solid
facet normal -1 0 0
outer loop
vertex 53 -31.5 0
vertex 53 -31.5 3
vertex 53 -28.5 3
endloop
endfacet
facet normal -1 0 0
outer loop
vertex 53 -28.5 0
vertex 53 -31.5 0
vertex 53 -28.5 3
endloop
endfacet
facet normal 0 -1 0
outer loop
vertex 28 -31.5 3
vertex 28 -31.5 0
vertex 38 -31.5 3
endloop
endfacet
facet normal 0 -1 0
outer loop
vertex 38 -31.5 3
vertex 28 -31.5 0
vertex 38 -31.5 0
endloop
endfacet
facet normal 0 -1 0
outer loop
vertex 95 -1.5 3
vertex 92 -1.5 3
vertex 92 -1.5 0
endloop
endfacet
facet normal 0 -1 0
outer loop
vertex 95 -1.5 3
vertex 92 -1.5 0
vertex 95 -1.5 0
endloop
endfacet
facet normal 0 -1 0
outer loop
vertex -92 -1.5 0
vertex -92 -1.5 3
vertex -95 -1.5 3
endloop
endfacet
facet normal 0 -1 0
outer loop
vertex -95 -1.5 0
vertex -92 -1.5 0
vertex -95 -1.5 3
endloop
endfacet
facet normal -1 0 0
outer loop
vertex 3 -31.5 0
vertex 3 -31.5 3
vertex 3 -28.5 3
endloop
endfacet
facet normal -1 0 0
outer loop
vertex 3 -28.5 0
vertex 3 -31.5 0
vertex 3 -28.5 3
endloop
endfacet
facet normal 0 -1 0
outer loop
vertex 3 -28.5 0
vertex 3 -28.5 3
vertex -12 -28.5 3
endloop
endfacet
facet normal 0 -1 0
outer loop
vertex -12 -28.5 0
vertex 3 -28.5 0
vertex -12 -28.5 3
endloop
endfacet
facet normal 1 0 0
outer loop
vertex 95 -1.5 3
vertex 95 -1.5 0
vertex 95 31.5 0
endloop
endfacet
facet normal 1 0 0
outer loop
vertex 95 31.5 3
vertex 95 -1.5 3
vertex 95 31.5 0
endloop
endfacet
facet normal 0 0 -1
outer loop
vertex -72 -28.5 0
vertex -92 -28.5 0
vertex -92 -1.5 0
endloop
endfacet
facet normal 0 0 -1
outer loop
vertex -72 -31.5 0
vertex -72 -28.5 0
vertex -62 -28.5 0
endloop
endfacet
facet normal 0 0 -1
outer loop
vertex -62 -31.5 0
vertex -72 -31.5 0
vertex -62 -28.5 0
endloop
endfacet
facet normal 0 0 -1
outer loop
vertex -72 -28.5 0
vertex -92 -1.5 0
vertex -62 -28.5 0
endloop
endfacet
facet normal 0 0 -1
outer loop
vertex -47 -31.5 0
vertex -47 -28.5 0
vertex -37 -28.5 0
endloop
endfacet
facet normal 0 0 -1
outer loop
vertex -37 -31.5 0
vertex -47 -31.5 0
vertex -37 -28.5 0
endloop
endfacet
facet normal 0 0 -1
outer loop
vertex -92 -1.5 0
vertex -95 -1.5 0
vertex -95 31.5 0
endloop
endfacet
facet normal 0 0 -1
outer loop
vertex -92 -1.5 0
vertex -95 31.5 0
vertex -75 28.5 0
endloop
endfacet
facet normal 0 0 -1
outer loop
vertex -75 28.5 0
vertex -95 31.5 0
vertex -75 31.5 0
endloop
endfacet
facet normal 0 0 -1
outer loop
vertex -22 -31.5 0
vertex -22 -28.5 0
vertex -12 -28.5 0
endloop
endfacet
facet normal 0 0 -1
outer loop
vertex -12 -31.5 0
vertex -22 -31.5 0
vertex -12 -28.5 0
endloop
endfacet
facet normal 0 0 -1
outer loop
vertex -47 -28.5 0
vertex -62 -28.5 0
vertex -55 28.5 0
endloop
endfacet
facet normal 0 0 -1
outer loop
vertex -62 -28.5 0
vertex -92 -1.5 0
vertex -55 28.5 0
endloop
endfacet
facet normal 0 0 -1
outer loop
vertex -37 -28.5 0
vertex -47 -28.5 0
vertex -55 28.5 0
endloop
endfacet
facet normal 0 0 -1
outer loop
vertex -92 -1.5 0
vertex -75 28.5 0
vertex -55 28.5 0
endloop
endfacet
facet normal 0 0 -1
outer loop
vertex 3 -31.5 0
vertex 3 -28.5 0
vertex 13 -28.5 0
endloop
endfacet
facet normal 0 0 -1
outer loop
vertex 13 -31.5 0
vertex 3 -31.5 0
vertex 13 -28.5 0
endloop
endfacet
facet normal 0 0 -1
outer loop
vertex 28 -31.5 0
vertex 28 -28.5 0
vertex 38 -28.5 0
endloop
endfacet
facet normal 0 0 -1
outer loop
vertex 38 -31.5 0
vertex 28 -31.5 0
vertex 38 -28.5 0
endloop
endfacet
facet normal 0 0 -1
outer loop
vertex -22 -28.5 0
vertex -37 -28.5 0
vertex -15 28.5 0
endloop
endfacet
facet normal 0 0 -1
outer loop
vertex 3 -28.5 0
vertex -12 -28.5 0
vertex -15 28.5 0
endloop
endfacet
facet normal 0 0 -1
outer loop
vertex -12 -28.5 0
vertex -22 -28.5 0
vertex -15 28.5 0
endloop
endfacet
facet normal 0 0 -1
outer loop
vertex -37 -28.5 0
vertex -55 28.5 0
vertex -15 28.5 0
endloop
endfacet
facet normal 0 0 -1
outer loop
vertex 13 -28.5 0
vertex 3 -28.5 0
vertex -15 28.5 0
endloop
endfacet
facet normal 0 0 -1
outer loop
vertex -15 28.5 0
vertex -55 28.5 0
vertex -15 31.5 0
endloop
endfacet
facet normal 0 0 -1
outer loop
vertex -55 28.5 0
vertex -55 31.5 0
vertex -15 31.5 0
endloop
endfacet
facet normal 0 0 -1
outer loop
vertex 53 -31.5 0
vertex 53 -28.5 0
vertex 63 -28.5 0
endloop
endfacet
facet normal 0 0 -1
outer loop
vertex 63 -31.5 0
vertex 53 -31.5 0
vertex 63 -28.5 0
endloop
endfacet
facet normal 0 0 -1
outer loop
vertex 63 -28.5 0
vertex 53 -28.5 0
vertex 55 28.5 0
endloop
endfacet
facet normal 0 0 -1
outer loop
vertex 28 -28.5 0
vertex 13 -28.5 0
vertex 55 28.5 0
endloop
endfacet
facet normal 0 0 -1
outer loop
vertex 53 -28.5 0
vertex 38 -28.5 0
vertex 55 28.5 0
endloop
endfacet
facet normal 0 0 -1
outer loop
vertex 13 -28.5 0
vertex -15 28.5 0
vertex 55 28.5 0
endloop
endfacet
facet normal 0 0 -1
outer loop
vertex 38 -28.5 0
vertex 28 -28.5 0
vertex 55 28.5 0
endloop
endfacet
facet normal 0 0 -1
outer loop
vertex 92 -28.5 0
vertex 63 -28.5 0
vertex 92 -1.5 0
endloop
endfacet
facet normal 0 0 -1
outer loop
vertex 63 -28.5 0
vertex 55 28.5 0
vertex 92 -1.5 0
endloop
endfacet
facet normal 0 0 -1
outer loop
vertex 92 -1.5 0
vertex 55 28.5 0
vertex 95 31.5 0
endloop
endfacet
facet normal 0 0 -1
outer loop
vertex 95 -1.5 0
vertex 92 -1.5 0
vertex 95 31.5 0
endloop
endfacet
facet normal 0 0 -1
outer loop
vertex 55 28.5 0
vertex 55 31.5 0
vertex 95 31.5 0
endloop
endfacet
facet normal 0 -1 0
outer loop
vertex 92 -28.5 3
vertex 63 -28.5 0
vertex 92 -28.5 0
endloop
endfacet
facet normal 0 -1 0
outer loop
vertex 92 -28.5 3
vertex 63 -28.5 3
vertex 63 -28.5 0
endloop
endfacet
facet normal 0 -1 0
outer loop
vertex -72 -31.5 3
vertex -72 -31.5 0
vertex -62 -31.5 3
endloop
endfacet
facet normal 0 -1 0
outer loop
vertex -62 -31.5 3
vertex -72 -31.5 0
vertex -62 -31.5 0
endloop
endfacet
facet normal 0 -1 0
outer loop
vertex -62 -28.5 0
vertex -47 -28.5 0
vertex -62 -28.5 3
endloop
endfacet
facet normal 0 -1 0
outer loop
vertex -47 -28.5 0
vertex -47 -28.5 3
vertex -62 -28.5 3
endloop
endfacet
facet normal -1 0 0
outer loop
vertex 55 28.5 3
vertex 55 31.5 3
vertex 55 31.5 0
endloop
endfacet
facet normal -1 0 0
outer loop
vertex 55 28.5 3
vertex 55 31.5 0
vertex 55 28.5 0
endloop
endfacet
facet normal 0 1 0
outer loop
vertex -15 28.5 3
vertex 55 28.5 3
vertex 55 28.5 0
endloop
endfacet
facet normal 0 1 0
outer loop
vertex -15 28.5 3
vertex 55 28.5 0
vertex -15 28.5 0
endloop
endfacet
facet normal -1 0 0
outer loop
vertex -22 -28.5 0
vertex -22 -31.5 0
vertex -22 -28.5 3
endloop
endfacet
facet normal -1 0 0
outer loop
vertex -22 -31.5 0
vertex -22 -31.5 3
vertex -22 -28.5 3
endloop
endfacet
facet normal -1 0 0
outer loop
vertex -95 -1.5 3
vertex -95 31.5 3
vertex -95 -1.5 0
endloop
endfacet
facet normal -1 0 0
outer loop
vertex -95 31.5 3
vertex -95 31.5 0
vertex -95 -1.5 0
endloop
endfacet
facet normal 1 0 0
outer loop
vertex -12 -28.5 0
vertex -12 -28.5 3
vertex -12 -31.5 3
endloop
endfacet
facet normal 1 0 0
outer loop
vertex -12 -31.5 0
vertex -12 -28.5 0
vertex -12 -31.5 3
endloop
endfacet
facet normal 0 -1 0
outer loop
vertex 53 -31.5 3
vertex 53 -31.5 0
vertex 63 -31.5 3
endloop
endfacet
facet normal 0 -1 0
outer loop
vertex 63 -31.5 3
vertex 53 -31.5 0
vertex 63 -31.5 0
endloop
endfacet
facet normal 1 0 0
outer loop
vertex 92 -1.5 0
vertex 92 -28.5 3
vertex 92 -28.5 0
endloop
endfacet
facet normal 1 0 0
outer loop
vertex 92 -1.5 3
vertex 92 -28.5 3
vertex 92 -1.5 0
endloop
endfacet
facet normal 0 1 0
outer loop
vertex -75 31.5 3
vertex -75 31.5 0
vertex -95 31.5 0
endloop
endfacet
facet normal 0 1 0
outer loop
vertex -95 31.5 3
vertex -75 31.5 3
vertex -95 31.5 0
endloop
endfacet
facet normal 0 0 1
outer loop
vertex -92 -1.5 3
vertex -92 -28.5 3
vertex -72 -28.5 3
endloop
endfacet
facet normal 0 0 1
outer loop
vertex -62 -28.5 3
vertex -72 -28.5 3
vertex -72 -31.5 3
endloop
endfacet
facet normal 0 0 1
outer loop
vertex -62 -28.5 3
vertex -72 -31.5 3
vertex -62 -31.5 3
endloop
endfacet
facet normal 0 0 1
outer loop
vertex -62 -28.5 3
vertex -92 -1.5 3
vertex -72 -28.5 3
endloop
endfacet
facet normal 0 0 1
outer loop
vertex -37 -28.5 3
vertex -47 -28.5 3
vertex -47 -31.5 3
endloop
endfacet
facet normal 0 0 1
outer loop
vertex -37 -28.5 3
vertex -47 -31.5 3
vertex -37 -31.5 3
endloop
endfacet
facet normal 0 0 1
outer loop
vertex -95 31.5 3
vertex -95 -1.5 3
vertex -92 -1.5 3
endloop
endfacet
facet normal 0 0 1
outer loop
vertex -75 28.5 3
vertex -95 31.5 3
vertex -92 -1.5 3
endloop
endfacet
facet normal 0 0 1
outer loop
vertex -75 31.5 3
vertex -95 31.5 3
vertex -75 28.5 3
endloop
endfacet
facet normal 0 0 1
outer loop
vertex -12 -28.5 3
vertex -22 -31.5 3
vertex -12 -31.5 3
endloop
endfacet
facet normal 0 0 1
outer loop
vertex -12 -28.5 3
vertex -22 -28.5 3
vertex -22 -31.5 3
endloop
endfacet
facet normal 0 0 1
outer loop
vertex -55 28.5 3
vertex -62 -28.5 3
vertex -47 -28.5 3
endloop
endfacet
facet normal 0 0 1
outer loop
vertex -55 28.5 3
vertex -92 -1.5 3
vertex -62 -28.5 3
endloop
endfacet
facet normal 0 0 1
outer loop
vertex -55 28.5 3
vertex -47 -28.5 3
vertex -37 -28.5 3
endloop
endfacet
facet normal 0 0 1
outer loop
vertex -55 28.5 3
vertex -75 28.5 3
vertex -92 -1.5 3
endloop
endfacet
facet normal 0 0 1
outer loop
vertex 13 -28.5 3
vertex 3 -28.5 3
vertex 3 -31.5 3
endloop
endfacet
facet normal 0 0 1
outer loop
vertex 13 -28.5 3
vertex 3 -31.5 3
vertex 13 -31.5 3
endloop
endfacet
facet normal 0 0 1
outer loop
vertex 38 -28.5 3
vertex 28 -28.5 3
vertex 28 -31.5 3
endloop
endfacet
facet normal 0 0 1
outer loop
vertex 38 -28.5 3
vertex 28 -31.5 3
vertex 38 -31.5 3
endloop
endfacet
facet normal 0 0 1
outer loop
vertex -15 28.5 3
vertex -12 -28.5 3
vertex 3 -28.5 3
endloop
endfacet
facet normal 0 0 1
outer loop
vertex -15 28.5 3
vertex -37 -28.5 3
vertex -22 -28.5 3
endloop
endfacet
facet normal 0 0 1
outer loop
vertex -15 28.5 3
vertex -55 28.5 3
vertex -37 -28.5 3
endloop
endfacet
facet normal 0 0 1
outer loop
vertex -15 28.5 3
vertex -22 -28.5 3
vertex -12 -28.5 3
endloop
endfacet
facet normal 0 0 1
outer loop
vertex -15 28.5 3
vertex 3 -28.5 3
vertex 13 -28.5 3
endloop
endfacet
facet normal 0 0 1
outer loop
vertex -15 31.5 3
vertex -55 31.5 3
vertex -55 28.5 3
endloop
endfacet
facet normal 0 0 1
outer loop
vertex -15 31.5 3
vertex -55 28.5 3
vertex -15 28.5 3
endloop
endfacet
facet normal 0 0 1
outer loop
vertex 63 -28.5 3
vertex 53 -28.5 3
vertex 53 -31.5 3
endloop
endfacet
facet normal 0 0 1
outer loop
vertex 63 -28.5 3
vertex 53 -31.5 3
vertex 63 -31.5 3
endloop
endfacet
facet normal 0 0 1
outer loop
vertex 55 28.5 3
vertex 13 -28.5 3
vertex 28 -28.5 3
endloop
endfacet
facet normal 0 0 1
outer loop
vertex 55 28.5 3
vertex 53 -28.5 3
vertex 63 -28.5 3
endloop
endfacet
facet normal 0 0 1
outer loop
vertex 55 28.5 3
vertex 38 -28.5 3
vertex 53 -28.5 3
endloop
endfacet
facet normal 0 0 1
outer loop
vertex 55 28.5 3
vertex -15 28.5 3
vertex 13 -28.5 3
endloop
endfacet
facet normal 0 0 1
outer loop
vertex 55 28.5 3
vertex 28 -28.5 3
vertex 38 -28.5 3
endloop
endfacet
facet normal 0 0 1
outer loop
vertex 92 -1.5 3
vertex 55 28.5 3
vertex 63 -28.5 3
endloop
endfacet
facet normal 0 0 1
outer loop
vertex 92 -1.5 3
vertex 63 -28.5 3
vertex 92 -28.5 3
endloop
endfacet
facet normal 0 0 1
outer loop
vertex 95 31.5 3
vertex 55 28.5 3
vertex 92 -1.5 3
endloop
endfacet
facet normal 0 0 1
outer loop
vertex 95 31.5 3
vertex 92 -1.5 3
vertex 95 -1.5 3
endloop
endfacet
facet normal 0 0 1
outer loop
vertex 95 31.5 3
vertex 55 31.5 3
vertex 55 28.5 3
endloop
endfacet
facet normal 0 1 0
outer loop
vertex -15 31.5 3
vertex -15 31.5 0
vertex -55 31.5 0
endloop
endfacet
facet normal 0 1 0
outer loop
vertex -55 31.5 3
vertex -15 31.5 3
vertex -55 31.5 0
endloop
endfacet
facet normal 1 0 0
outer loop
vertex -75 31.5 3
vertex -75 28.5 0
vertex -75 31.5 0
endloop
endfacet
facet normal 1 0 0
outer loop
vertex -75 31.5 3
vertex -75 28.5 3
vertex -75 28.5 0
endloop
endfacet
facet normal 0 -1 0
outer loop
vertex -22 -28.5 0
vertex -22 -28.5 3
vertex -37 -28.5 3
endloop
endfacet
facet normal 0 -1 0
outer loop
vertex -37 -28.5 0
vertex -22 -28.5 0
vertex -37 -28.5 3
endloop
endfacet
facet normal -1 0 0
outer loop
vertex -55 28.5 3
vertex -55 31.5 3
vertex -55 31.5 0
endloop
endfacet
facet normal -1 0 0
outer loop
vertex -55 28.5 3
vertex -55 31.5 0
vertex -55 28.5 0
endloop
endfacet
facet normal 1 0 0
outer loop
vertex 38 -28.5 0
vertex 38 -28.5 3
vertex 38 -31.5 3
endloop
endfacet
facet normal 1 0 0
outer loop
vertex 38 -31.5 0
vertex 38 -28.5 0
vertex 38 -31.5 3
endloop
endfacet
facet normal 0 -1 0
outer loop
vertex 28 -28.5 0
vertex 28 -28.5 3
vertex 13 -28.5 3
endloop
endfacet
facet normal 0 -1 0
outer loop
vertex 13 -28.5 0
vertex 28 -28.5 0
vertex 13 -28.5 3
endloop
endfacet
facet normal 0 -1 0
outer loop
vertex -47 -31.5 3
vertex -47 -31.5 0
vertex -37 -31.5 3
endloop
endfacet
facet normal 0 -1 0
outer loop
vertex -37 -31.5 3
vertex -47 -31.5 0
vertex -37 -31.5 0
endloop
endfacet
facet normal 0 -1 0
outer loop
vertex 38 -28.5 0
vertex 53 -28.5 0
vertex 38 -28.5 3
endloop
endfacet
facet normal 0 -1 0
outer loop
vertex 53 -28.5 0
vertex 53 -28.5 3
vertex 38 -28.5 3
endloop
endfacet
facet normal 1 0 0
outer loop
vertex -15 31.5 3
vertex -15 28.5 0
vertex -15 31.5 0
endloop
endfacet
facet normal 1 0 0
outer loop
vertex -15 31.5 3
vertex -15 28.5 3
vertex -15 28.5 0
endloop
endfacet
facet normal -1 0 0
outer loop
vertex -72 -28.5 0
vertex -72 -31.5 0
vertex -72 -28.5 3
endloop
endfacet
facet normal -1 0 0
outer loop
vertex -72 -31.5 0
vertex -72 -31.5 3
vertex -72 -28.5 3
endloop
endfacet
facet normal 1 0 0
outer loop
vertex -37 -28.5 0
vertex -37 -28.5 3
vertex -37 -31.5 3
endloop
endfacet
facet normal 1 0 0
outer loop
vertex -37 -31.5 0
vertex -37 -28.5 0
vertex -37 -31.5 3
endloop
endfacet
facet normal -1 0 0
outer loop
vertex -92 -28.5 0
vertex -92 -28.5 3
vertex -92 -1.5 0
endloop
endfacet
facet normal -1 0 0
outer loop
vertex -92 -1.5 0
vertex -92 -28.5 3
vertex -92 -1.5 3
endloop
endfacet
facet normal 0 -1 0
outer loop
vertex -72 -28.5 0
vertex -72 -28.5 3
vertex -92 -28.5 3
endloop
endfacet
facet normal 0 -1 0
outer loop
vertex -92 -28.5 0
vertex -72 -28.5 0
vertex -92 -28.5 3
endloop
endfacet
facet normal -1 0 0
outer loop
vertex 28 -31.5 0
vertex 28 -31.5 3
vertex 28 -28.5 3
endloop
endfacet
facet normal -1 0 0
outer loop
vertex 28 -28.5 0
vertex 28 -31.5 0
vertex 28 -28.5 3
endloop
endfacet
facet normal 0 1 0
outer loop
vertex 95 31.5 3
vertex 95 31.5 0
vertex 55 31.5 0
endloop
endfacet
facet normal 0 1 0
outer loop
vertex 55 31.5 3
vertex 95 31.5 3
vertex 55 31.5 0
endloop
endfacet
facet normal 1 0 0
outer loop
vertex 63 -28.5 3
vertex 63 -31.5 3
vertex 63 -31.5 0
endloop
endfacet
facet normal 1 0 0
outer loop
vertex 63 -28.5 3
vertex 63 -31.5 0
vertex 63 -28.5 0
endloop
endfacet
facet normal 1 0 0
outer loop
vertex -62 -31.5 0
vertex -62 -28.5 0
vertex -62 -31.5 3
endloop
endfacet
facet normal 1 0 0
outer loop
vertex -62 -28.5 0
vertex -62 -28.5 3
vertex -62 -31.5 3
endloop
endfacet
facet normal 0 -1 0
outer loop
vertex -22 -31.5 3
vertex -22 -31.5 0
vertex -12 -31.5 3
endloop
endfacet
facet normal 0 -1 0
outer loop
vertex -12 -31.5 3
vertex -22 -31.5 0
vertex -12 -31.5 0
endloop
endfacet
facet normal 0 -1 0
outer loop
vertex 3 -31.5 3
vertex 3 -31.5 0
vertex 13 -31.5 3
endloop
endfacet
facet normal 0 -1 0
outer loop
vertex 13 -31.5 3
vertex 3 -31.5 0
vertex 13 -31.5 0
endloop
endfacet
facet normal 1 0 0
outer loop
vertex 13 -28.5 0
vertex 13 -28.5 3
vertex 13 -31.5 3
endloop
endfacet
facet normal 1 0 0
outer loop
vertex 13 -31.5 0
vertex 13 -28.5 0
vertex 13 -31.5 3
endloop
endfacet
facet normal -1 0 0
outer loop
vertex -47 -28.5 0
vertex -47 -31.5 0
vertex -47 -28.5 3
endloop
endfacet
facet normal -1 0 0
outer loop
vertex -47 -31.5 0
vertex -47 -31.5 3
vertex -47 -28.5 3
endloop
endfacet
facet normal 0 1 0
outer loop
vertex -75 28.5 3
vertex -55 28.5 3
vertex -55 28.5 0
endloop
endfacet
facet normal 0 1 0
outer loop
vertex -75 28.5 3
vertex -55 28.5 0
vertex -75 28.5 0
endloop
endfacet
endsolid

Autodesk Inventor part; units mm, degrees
ref_plane "YZ Plane" through (0, 0, 0) normal (1, 0, 0) x (0, 1, 0)
ref_plane "XZ Plane" through (0, 0, 0) normal (0, 1, 0) x (-1, 0, 0)
ref_plane "XY Plane" through (0, 0, 0) normal (0, 0, 1) x (1, 0, 0)
sketch "Sketch1" plane through (0, 0, 0) normal (0, 0, 1) x (1, 0, 0)
  line L0 (-95, -31.5) -> (95, -31.5)
  line L1 (95, -31.5) -> (95, 31.5)
  line L2 (95, 31.5) -> (-95, 31.5)
  line L3 (-95, 31.5) -> (-95, -31.5)
  line L4 (-95, -31.5) -> (95, 31.5) construction
  line L5 (95, -31.5) -> (-95, 31.5) construction
  point P0 (0, 0)
  dimension "d0" = 190
  dimension "d1" = 63
extrude "Extrusion1" add sketch "Sketch1" along normal blind 3
sketch "Sketch2" plane through (0, 0, 3) normal (0, 0, 1) x (1, 0, 0)
  line L0 (-95, 31.5) -> (-95, -31.5) projected
  line L1 (-95, -31.5) -> (-92, -31.5)
  line L2 (-92, -31.5) -> (-92, -1.5)
  line L3 (-92, -1.5) -> (-95, -1.5)
  line L4 (-95, -1.5) -> (-95, -31.5)
  line L5 (-92, -31.5) -> (-72, -31.5)
  line L6 (-72, -31.5) -> (-72, -28.5)
  line L7 (-72, -28.5) -> (-92, -28.5)
  line L8 (-92, -28.5) -> (-92, -31.5)
  line L9 (-95, -31.5) -> (95, -31.5) projected
  line L10 (-62, -31.5) -> (-47, -31.5)
  line L11 (-47, -31.5) -> (-47, -28.5)
  line L12 (-47, -28.5) -> (-62, -28.5)
  line L13 (-62, -28.5) -> (-62, -31.5)
  line L14 (-37, -31.5) -> (-22, -31.5)
  line L15 (-22, -31.5) -> (-22, -28.5)
  line L16 (-22, -28.5) -> (-37, -28.5)
  line L17 (-37, -28.5) -> (-37, -31.5)
  line L18 (-12, -31.5) -> (3, -31.5)
  line L19 (3, -31.5) -> (3, -28.5)
  line L20 (3, -28.5) -> (-12, -28.5)
  line L21 (-12, -28.5) -> (-12, -31.5)
  line L22 (13, -31.5) -> (28, -31.5)
  line L23 (28, -31.5) -> (28, -28.5)
  line L24 (28, -28.5) -> (13, -28.5)
  line L25 (13, -28.5) -> (13, -31.5)
  line L26 (38, -31.5) -> (53, -31.5)
  line L27 (53, -31.5) -> (53, -28.5)
  line L28 (53, -28.5) -> (38, -28.5)
  line L29 (38, -28.5) -> (38, -31.5)
  line L30 (95, -31.5) -> (92, -31.5)
  line L31 (92, -31.5) -> (92, -1.5)
  line L32 (92, -1.5) -> (95, -1.5)
  line L33 (95, -1.5) -> (95, -31.5)
  line L34 (92, -31.5) -> (63, -31.5)
  line L35 (63, -31.5) -> (63, -28.5)
  line L36 (63, -28.5) -> (92, -28.5)
  line L37 (92, -28.5) -> (92, -31.5)
  point P0 (0, 0)
  dimension "d4" = 3
  dimension "d5" = 30
  dimension "d7" = 20
  dimension "d8" = 3
  dimension "d9" = 15
  dimension "d10" = 15
  dimension "d11" = 15
  dimension "d12" = 15
  dimension "d13" = 15
  dimension "d14" = 10
  dimension "d15" = 10
  dimension "d16" = 10
  dimension "d17" = 10
  dimension "d18" = 10
  dimension "d20" = 3
  dimension "d21" = 30
  dimension "d22" = 10
extrude "Extrusion2" cut sketch "Sketch2" against normal through all
sketch "Sketch3" plane through (0, 0, 3) normal (0, 0, 1) x (1, 0, 0)
  line L0 (95, 31.5) -> (-95, 31.5) projected
  line L1 (-15, 31.5) -> (55, 31.5)
  line L2 (55, 31.5) -> (55, 28.5)
  line L3 (55, 28.5) -> (-15, 28.5)
  line L4 (-15, 28.5) -> (-15, 31.5)
  line L5 (95, -1.5) -> (95, 31.5) projected
  line L6 (-75, 31.5) -> (-55, 31.5)
  line L7 (-55, 31.5) -> (-55, 28.5)
  line L8 (-55, 28.5) -> (-75, 28.5)
  line L9 (-75, 28.5) -> (-75, 31.5)
  line L10 (-95, 31.5) -> (-95, -1.5) projected
  point P0 (0, 0)
  dimension "d25" = 3
  dimension "d26" = 40
  dimension "d27" = 70
  dimension "d28" = 20
  dimension "d29" = 20
extrude "Extrusion3" cut sketch "Sketch3" against normal through all
equation "\"d10\" = d9"
equation "\"d11\" = d10"
equation "\"d12\" = d11"
equation "\"d13\" = d12"
equation "\"d15\" = d14"
equation "\"d16\" = d15"
equation "\"d17\" = d16"
equation "\"d18\" = d16"
equation "\"d22\" = d14"
properties part number "back"
